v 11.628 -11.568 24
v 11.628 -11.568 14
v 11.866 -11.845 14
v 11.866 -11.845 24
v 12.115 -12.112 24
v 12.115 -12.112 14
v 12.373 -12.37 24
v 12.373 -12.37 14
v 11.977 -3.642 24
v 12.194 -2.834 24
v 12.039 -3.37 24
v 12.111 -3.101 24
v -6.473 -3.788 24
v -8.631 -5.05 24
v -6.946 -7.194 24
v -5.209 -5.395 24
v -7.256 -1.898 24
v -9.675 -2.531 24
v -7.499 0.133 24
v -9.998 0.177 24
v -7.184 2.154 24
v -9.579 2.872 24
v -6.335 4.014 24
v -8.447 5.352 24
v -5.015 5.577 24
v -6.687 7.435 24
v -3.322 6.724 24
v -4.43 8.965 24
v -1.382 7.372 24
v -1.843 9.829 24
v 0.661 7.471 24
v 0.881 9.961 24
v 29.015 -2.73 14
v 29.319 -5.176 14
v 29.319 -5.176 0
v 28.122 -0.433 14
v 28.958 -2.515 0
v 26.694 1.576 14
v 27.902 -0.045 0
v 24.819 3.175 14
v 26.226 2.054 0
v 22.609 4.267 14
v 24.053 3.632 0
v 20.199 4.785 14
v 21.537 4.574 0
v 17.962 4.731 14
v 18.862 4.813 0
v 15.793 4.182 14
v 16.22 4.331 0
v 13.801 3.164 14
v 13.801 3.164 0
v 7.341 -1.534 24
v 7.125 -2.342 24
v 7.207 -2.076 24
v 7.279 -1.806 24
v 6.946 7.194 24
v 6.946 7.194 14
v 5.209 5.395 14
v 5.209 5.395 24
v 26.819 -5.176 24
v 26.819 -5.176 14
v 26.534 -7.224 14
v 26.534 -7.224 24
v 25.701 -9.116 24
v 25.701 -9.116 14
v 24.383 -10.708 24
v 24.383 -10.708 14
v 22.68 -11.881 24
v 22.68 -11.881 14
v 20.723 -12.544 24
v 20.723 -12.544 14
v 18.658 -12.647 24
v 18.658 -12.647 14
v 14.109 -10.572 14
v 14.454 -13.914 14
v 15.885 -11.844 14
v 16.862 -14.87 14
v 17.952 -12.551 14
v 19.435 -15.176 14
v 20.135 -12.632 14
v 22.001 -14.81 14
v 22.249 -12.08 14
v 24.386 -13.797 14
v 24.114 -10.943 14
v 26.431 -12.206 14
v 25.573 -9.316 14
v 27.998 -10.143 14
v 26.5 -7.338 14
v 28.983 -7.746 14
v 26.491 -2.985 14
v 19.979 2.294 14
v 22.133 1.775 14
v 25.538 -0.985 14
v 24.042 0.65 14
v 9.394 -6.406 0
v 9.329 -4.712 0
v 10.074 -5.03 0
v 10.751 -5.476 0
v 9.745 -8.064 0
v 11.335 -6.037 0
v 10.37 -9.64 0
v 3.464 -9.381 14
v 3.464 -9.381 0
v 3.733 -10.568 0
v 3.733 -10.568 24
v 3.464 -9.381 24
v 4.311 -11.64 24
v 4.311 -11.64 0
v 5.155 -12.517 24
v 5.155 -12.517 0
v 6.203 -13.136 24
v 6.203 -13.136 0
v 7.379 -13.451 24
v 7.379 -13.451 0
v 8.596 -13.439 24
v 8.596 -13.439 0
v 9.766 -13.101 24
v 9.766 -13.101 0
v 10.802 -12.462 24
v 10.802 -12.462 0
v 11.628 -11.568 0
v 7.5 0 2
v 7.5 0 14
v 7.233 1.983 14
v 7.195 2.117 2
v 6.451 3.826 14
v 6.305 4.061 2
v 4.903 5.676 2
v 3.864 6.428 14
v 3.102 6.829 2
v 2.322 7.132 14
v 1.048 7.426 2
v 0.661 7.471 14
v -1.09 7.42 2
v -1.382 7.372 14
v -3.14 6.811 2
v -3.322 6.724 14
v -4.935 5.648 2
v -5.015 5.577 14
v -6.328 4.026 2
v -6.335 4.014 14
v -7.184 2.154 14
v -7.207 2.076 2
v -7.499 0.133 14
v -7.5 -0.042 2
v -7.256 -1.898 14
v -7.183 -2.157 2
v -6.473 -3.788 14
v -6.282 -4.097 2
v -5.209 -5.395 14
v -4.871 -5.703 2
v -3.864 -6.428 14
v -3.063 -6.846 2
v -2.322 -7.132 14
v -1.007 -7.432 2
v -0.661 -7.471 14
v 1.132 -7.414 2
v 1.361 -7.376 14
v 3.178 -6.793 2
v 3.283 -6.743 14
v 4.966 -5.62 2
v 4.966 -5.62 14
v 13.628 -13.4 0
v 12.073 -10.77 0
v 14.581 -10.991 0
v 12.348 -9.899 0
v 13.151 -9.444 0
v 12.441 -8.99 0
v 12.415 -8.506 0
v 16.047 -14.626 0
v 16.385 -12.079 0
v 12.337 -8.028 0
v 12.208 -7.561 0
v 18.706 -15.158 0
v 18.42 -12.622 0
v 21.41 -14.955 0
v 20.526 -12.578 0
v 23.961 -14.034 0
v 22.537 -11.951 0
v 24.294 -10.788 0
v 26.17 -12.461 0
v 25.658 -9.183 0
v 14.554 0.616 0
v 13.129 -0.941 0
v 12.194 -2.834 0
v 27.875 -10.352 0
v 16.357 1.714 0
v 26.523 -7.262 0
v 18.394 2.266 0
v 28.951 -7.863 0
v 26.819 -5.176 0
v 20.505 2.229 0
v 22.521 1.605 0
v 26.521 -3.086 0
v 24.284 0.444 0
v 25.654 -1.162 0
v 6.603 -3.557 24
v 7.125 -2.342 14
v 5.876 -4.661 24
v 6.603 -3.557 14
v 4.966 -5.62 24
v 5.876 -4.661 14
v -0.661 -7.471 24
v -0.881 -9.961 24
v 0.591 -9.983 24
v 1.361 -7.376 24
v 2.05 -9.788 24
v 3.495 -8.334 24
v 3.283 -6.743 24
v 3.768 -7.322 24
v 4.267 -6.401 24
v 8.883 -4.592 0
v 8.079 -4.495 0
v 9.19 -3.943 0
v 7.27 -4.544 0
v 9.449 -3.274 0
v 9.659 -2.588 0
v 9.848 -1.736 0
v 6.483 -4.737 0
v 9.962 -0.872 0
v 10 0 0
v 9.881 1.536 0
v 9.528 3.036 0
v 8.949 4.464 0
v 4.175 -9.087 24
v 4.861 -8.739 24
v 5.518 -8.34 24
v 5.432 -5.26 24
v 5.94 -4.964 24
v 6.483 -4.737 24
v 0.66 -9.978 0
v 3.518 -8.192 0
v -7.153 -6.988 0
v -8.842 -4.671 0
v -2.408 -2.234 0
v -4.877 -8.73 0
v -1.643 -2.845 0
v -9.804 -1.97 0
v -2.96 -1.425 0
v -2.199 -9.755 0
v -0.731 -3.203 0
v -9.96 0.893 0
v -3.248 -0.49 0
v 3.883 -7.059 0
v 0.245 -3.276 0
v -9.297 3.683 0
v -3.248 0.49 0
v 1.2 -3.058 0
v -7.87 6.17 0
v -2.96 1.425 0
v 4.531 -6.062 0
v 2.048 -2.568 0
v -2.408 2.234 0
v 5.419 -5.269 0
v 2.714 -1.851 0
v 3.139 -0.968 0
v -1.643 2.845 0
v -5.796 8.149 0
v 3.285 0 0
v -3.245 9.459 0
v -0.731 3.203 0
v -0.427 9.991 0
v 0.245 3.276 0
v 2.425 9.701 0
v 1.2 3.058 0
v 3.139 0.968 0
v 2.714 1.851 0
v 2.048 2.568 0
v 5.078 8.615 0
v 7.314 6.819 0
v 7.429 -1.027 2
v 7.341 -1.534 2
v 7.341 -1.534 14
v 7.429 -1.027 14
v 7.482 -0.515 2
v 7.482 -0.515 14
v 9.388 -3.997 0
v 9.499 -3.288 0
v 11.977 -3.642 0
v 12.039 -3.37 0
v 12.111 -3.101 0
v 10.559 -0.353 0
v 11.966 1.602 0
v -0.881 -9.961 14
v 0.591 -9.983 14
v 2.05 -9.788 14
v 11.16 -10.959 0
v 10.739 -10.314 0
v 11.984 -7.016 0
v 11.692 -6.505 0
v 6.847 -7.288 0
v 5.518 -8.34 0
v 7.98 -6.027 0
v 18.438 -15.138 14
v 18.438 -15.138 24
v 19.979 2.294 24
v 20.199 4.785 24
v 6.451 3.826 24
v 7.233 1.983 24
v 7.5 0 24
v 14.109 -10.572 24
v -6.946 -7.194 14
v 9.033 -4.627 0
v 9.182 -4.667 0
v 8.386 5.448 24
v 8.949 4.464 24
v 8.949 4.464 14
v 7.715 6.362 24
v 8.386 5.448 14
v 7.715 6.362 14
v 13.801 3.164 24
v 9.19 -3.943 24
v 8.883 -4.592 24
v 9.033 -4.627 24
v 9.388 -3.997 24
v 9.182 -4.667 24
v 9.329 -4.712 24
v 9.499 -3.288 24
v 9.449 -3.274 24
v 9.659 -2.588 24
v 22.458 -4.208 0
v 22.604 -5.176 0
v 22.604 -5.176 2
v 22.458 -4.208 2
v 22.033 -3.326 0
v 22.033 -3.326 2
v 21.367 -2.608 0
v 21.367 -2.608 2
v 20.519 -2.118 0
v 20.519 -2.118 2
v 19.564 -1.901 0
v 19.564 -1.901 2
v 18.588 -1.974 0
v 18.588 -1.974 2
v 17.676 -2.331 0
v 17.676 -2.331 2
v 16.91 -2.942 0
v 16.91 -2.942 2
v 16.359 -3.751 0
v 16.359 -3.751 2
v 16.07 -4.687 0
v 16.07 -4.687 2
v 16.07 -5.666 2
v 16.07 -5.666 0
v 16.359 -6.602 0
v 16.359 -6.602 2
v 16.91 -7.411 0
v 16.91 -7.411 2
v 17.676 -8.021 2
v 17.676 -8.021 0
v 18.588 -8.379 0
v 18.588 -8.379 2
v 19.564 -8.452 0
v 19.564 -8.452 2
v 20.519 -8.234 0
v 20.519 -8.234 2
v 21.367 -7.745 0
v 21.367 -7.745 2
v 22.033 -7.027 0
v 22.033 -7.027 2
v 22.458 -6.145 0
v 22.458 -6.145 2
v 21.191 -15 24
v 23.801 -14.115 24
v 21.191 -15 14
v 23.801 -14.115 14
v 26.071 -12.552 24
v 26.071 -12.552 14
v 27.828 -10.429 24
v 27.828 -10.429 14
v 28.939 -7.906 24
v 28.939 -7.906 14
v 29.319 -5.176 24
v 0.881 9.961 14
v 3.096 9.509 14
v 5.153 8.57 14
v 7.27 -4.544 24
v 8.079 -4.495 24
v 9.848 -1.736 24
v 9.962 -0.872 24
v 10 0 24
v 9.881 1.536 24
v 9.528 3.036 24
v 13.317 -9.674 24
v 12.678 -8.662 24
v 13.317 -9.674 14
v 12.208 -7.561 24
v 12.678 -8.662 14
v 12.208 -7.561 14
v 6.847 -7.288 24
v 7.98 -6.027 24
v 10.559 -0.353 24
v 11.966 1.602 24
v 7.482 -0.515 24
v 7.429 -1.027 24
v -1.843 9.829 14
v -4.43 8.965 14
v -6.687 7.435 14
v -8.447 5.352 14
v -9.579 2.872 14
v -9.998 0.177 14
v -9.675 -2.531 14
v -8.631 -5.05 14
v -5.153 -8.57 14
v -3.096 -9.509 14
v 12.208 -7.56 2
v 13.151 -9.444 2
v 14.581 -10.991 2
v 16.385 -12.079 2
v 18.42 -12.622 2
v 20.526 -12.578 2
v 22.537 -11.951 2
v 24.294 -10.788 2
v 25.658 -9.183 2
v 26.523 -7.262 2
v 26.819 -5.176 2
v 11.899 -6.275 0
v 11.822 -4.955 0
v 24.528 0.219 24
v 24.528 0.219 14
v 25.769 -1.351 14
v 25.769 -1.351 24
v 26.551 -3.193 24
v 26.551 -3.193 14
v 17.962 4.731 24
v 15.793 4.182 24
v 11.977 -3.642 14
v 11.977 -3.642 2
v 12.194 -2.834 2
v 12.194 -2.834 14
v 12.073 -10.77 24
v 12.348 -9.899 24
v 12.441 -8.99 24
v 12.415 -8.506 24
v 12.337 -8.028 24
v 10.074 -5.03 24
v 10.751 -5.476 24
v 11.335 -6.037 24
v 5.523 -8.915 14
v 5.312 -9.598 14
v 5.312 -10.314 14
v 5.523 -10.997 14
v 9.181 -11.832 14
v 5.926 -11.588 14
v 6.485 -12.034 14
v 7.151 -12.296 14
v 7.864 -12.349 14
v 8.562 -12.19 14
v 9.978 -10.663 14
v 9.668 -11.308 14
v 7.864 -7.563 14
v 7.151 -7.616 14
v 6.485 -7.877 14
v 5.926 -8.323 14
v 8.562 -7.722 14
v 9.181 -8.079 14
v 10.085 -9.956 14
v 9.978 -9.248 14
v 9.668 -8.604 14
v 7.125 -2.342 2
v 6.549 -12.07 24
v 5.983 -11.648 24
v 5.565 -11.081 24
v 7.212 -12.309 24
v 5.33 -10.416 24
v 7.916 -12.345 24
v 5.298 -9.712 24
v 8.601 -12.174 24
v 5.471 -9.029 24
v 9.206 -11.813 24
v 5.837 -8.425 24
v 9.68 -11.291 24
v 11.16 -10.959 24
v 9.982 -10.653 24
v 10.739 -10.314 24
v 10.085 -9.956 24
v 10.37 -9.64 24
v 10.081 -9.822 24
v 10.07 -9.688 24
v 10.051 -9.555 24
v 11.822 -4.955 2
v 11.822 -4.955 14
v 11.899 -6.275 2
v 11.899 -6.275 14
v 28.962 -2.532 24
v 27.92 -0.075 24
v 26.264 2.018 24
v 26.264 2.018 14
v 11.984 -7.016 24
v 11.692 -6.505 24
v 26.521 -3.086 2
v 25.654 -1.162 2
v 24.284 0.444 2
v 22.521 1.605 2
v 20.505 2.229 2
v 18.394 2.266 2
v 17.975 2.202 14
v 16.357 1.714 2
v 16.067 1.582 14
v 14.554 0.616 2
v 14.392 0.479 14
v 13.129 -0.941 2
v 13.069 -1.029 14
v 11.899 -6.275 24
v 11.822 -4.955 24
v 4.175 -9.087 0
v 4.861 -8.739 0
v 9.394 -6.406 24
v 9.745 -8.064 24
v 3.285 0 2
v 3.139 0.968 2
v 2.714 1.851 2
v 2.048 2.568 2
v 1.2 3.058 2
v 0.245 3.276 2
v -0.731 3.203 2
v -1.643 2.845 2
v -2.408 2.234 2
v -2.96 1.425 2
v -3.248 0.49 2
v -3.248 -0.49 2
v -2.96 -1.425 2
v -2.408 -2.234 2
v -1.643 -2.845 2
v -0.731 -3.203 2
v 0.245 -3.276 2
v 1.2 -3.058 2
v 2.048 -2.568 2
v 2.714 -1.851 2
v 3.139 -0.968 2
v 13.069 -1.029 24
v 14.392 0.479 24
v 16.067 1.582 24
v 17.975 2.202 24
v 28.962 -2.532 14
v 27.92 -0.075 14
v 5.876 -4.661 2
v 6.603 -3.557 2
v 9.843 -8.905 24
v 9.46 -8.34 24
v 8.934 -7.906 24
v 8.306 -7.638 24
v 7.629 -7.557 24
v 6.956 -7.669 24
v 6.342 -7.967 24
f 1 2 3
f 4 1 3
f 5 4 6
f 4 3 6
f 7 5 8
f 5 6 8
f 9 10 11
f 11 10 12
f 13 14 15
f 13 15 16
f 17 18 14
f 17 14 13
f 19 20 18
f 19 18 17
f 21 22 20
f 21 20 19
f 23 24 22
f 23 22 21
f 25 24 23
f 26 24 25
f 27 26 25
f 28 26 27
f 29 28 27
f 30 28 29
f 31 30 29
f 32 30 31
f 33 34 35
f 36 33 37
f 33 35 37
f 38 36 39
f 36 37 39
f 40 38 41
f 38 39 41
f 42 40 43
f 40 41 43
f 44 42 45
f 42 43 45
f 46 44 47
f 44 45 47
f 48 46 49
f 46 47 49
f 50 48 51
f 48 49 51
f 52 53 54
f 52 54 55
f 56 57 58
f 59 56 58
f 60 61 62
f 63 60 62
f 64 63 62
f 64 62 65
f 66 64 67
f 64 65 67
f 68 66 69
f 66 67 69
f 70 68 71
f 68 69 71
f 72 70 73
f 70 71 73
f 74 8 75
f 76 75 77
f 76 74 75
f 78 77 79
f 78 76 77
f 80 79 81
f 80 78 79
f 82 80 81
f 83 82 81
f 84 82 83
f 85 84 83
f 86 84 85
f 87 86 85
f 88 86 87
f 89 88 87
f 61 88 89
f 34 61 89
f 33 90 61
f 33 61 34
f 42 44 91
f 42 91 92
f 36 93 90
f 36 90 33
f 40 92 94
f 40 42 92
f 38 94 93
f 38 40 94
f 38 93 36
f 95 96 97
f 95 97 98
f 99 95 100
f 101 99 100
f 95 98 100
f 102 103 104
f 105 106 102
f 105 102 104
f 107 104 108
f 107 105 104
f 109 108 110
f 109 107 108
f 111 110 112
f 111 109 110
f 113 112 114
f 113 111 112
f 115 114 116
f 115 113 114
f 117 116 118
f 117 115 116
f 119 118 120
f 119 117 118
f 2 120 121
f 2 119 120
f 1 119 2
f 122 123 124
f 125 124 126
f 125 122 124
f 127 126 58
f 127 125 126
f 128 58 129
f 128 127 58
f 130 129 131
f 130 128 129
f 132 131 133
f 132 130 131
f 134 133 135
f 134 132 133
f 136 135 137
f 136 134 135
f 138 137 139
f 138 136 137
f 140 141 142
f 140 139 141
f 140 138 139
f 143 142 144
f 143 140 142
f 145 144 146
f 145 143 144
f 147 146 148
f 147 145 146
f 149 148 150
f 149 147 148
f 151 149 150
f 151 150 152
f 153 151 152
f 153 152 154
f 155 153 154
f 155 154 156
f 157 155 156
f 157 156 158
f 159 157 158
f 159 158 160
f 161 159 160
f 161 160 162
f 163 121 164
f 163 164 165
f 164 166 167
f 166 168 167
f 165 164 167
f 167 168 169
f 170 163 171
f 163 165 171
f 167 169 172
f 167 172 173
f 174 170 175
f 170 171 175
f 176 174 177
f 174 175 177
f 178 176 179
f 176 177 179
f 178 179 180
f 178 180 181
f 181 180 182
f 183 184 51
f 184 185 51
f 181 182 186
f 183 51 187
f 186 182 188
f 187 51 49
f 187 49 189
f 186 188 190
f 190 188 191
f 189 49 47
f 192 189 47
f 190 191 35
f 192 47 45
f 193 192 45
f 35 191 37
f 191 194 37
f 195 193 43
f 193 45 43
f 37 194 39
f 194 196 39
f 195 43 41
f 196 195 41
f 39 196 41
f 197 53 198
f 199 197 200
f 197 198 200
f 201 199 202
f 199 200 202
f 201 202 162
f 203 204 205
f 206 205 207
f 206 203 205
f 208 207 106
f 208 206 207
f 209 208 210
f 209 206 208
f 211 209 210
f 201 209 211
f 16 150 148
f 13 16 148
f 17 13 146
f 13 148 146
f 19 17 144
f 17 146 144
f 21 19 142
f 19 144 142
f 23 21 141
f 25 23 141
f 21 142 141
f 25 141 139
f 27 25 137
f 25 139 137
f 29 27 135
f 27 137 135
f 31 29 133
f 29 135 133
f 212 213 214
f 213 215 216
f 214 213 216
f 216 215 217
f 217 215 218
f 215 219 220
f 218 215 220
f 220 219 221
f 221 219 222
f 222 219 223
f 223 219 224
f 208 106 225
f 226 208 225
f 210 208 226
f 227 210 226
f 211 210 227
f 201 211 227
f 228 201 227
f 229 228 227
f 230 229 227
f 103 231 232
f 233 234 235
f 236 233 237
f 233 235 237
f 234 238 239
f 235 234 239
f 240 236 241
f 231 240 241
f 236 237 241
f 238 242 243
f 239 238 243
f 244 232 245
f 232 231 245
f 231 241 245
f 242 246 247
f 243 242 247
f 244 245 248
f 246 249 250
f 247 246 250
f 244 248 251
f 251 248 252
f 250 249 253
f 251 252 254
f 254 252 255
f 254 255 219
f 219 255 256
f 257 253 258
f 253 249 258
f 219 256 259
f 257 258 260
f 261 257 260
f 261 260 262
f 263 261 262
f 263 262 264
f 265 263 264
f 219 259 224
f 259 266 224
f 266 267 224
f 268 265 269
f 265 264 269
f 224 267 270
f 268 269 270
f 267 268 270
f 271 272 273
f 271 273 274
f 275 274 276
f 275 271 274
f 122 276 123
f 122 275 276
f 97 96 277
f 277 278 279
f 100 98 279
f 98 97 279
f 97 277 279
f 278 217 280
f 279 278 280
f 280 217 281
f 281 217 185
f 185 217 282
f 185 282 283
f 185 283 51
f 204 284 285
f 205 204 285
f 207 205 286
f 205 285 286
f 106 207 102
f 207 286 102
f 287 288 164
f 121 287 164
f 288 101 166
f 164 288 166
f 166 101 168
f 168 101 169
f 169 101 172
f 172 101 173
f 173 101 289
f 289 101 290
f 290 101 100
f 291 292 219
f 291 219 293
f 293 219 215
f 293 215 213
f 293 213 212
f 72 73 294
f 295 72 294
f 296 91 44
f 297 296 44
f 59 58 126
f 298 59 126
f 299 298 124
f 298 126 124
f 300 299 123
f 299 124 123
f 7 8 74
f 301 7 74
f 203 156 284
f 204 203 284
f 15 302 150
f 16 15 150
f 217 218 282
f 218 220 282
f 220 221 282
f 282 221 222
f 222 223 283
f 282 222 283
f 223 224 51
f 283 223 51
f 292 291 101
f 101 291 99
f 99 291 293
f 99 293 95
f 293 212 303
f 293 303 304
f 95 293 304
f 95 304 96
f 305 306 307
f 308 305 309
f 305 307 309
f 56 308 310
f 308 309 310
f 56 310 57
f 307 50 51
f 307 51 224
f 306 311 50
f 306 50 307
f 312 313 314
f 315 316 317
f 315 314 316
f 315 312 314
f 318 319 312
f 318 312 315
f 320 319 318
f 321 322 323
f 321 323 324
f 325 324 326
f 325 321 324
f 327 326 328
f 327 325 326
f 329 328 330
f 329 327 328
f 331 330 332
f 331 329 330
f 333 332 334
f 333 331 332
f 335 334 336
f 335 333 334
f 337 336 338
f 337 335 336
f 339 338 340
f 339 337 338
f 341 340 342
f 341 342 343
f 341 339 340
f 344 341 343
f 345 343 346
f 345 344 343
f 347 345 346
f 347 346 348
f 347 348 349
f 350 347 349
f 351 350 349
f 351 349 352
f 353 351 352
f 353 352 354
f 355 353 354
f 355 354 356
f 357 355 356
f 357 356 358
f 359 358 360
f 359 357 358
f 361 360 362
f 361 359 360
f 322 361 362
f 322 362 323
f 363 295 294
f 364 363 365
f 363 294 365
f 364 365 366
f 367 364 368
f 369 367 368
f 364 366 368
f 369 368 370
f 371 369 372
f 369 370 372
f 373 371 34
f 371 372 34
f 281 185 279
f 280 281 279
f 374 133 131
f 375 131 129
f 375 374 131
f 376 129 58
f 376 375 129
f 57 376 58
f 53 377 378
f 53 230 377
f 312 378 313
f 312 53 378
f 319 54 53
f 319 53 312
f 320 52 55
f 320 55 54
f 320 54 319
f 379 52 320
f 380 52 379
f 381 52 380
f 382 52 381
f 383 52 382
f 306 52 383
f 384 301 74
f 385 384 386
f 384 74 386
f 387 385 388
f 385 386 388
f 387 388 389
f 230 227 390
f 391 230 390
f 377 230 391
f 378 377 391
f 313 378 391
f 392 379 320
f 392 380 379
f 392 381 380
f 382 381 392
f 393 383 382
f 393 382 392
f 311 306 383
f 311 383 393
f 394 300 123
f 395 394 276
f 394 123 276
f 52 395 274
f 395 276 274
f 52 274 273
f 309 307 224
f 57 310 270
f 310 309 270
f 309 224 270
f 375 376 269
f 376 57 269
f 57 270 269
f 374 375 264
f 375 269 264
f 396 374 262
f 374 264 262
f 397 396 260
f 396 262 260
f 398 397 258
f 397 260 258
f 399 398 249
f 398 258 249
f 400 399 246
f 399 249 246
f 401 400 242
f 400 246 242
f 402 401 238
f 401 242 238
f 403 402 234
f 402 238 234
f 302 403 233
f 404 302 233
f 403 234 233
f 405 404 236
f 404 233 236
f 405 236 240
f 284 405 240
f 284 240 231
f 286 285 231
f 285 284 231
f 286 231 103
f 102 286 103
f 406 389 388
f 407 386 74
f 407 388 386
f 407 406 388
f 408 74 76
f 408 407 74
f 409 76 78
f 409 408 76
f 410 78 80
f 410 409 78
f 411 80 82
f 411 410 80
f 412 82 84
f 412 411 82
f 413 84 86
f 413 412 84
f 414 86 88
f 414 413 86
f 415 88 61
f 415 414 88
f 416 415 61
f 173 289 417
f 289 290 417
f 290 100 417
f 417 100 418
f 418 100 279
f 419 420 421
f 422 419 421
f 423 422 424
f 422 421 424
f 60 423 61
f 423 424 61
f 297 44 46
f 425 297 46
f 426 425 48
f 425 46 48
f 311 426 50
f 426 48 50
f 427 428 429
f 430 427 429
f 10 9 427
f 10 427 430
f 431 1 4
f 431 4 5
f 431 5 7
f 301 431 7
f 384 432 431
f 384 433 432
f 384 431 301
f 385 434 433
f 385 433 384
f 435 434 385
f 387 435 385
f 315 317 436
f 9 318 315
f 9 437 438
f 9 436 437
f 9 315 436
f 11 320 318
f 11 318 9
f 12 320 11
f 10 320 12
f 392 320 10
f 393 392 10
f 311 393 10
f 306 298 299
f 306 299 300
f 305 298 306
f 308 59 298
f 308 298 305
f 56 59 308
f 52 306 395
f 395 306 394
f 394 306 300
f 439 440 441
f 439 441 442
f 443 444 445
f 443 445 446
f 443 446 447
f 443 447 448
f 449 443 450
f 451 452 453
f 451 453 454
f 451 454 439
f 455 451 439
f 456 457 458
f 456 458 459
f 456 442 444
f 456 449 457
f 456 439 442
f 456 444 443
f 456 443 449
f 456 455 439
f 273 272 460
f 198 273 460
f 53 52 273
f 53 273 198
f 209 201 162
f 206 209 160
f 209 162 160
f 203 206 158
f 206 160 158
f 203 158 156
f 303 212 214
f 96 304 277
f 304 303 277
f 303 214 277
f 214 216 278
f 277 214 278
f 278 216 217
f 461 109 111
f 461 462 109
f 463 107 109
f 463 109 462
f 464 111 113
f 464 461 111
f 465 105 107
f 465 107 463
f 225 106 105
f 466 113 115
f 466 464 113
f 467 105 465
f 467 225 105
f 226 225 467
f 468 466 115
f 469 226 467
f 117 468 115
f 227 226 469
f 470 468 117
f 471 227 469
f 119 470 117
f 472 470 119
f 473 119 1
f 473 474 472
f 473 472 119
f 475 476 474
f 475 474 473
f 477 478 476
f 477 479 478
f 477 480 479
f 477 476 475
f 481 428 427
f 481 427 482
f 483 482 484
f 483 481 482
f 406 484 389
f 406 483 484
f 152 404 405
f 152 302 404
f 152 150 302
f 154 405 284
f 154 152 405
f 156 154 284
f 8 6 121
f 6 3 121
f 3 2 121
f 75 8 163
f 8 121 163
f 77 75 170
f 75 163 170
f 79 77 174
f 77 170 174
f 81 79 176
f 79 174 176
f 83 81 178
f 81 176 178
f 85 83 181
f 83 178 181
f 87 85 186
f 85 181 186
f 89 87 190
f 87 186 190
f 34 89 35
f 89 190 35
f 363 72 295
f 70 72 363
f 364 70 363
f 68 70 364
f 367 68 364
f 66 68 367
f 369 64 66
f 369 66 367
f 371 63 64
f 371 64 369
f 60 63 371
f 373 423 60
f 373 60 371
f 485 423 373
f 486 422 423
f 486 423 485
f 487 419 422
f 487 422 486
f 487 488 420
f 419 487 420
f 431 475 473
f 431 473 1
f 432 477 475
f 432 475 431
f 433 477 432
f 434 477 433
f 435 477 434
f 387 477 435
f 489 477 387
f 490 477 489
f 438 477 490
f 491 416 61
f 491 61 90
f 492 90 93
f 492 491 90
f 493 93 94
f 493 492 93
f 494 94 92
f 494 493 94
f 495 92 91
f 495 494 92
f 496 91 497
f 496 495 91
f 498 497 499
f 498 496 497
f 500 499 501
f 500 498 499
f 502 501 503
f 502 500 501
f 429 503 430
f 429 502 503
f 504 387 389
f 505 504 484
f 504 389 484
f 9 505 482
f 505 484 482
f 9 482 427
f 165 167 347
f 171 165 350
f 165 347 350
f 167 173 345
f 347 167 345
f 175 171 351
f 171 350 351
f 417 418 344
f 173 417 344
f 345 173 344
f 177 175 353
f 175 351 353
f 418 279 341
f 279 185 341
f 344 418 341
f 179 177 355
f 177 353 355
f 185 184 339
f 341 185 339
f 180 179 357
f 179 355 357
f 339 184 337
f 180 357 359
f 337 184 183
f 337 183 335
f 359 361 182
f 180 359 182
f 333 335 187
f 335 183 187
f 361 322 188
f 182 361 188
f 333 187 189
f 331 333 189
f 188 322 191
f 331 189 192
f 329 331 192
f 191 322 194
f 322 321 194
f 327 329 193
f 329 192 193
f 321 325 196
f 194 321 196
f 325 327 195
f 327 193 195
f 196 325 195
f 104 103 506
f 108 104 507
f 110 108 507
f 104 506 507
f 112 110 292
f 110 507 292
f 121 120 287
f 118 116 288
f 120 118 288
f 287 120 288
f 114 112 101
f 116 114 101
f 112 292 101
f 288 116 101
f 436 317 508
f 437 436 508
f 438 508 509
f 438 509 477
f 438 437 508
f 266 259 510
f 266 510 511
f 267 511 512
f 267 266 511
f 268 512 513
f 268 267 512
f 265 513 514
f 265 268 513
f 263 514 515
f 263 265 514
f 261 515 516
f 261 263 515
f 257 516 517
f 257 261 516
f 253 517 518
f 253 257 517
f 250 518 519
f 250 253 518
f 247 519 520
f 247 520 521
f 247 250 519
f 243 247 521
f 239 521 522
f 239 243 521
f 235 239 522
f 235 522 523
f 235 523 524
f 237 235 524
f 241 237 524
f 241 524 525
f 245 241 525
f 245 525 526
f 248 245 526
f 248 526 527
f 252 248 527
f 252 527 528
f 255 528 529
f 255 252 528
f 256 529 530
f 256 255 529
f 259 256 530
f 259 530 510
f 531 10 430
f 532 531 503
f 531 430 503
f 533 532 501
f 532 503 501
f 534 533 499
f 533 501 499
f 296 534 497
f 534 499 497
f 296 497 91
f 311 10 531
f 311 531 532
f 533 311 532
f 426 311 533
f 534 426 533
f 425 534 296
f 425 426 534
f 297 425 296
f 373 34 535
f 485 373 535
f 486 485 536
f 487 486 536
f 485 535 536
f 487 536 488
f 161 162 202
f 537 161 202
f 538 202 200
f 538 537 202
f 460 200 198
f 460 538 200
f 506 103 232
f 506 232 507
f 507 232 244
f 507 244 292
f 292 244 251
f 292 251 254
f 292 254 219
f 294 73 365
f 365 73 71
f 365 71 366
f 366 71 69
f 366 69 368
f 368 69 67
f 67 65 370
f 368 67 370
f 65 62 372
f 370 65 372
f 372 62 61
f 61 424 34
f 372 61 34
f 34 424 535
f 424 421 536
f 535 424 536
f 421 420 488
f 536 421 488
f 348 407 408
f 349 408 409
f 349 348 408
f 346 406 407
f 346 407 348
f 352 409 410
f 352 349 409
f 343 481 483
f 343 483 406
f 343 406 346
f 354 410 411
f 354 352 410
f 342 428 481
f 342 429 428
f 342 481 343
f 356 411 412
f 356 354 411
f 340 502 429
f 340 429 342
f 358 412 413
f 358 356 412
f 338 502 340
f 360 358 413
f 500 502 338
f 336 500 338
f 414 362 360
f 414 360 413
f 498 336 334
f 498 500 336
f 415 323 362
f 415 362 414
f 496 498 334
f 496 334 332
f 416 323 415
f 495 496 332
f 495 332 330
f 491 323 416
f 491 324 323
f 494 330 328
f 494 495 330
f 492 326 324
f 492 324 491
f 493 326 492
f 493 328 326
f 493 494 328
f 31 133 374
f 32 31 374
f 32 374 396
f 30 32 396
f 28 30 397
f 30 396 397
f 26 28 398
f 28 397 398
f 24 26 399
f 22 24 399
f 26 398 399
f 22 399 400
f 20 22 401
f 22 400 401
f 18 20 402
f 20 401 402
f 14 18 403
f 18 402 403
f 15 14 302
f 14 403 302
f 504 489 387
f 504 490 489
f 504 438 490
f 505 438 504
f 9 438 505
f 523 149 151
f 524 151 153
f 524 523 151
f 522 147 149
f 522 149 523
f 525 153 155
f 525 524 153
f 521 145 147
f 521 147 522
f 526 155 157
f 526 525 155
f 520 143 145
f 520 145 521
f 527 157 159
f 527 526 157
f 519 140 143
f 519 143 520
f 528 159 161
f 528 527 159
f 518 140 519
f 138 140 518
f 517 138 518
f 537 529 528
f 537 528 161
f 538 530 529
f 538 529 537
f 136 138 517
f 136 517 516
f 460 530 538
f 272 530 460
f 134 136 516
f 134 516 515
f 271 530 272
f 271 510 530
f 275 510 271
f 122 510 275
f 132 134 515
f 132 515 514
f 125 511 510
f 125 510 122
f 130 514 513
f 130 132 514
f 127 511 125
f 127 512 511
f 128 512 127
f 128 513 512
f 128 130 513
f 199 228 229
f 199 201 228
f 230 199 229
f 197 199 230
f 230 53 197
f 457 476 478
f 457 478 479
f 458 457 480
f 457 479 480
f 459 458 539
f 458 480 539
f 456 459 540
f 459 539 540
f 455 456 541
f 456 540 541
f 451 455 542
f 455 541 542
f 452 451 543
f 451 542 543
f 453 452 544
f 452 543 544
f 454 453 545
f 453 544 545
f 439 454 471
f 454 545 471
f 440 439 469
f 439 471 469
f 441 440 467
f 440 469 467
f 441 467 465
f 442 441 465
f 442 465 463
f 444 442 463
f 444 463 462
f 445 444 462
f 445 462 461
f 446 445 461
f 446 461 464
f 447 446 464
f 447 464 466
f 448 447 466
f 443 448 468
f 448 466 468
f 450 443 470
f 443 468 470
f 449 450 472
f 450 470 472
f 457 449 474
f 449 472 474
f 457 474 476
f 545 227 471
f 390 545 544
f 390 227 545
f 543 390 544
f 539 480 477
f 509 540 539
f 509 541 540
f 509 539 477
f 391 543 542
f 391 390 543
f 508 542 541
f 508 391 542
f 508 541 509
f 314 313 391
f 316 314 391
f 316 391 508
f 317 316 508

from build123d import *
from build123d.topology import SkipClean

# Parameters (mm, degrees)
SKETCH1_R             = 7.5
SKETCH1_R_2           = 3.285
BOSS_EXTRUDE1_DEPTH   = 2
BOSS_EXTRUDE1_2_DEPTH = 2
SKETCH1_3_R           = 10
SKETCH1_3_R_2         = 7.5
BOSS_EXTRUDE2_DEPTH   = 14
BOSS_EXTRUDE3_DEPTH   = 10
BOSS_EXTRUDE4_DEPTH   = 24
SKETCH5_R             = 4.496880173
BOSS_EXTRUDE5_DEPTH   = 24
SKETCH6_R             = 2.4
CUT_EXTRUDE1_DEPTH    = 10


with BuildPart() as part:
    # Sketch1 → Boss-Extrude1 (new body)
    with BuildSketch(Plane.XY):
        Circle(SKETCH1_R)
        Circle(SKETCH1_R_2, mode=Mode.SUBTRACT)
    extrude(amount=BOSS_EXTRUDE1_DEPTH)

    # Sketch1<3> → Boss-Extrude2 (add)
    # profile 1 of 2: a face of its own
    with BuildSketch(Plane.XY):
        Circle(SKETCH1_3_R)
        Circle(SKETCH1_3_R_2, mode=Mode.SUBTRACT)
    # profile 2 of 2: a face of its own
    with BuildSketch(Plane.XY):
        with Locations((19.318516526, -5.176380902)):
            Circle(SKETCH1_3_R)
        with Locations((19.318516526, -5.176380902)):
            Circle(SKETCH1_3_R_2, mode=Mode.SUBTRACT)
    extrude(amount=BOSS_EXTRUDE2_DEPTH)


with BuildPart() as body_2:
    # Sketch1 → Boss-Extrude1 2 (new body)
    with BuildSketch(Plane.XY):
        with Locations((19.318516526, -5.176380902)):
            Circle(SKETCH1_R)
        with Locations((19.318516526, -5.176380902)):
            Circle(SKETCH1_R_2, mode=Mode.SUBTRACT)
    extrude(amount=BOSS_EXTRUDE1_2_DEPTH)



with BuildPart() as boss_extrude2_piece_1:
    # of the separate pieces the step leaves, piece 1, a body of its own (boss_extrude2_pieces)
    add(part.part.solids().sort_by_distance((3.285, 0, 0))[0])

    # Sketch2 → Boss-Extrude3 (add)
    with SkipClean():  # the faces are left unmerged after this step: merging them gives an invalid solid
        with BuildSketch(Plane.XY.offset(14)):
            with BuildLine():
                ThreePointArc((0.880723614, 9.961140794), (-9.097879067, 4.150734451), (-6.945976325, -7.193984493))
                Line((-6.945976325, -7.193984493), (-5.209482244, -5.39548837))
                ThreePointArc((-5.209482244, -5.39548837), (-6.8234093, 3.113050838), (0.66054271, 7.470855595))
                Line((0.66054271, 7.470855595), (0.880723614, 9.961140794))
            make_face()
            with BuildLine():
                Line((-0.66054271, -7.470855595), (-0.880723614, -9.961140794))
                ThreePointArc((-0.880723614, -9.961140794), (5.731995045, -8.194158456), (9.659258283, -2.588190376))
                ThreePointArc((9.659258283, -2.588190376), (9.914448619, -1.305261884), (10, 0))
                ThreePointArc((10, 0), (9.204883575, 3.907699883), (6.945976325, 7.193984493))
                Line((6.945976325, 7.193984493), (5.209482244, 5.39548837))
                ThreePointArc((5.209482244, 5.39548837), (6.903662681, 2.930774912), (7.5, 0))
                ThreePointArc((7.5, 0), (5.06438198, -5.531910625), (-0.66054271, -7.470855595))
            make_face()
            with BuildLine():
                ThreePointArc((20.199240139, 4.784759892), (13.586521544, 3.017777598), (9.659258283, -2.588190376))
                ThreePointArc((9.659258283, -2.588190376), (9.68232481, -7.849171431), (12.372540201, -12.370365396))
                Line((12.372540201, -12.370365396), (14.109034282, -10.571869272))
                ThreePointArc((14.109034282, -10.571869272), (12.495107225, -2.063330064), (19.979059236, 2.294474693))
                Line((19.979059236, 2.294474693), (20.199240139, 4.784759892))
            make_face()
            with BuildLine():
                ThreePointArc((29.318516526, -5.176380902), (28.523400101, -1.268681019), (26.264492851, 2.017603591))
                Line((26.264492851, 2.017603591), (24.52799877, 0.219107468))
                ThreePointArc((24.52799877, 0.219107468), (26.222179207, -2.24560599), (26.818516526, -5.176380902))
                ThreePointArc((26.818516526, -5.176380902), (24.382898506, -10.708291527), (18.657973816, -12.647236497))
                Line((18.657973816, -12.647236497), (18.437792912, -15.137521696))
                ThreePointArc((18.437792912, -15.137521696), (26.071025832, -12.552261735), (29.318516526, -5.176380902))
            make_face()
        extrude(amount=BOSS_EXTRUDE3_DEPTH)


with BuildPart() as boss_extrude2_piece_2:
    # of the separate pieces the step leaves, piece 2, a body of its own (boss_extrude2_pieces)
    add(part.part.solids().sort_by_distance((29.318516526, -5.176380902, 0))[0])


with BuildPart() as boss_extrude3_piece_1:
    # of the separate pieces the step leaves, piece 1, a body of its own (boss_extrude3_pieces)
    add(boss_extrude2_piece_1.part.solids().sort_by_distance((3.285, 0, 0))[0])


with BuildPart() as boss_extrude3_piece_2:
    # of the separate pieces the step leaves, piece 2, a body of its own (boss_extrude3_pieces)
    add(boss_extrude2_piece_1.part.solids().sort_by_distance((18.437792912, -15.137521696, 14))[0])


with BuildPart() as boss_extrude3_piece_3:
    # of the separate pieces the step leaves, piece 3, a body of its own (boss_extrude3_pieces)
    add(boss_extrude2_piece_1.part.solids().sort_by_distance((20.199240139, 4.784759892, 14))[0])


with BuildPart() as body_2_1:
    with SkipClean():  # the faces are left unmerged after this step: merging them gives an invalid solid
        add(body_2.part)

        add(boss_extrude2_piece_2.part)  # Boss-Extrude4 merges Boss-Extrude2 piece 2

        add(boss_extrude3_piece_1.part)  # Boss-Extrude4 merges Boss-Extrude3 piece 1

        add(boss_extrude3_piece_3.part)  # Boss-Extrude4 merges Boss-Extrude3 piece 3
        # Sketch4 → Boss-Extrude4 (add)
        with BuildSketch(Plane.XY.offset(24)):
            Polygon((13.800709497, 3.163511519), (8.948507271, 4.463655187), (5.517807029, -8.339892421), (10.370009255, -9.640036089), align=None)
        extrude(amount=-BOSS_EXTRUDE4_DEPTH)

    # Sketch5 → Boss-Extrude5 (add)
    with SkipClean():  # the faces are left unmerged after this step: merging them gives an invalid solid
        with BuildSketch(Plane.XY.offset(24)):
            with Locations((7.943908142, -8.989964255)):
                Circle(SKETCH5_R)
        extrude(amount=-BOSS_EXTRUDE5_DEPTH)

    # Sketch6 → Cut-Extrude1 (cut)
    with SkipClean():  # the faces are left unmerged after this step: merging them gives an invalid solid
        with BuildSketch(Plane.XY.offset(24)):
            with Locations((7.685089097, -9.955890081)):
                Circle(SKETCH6_R)
        extrude(amount=-CUT_EXTRUDE1_DEPTH, mode=Mode.SUBTRACT)


solid = Compound([boss_extrude3_piece_2.part, body_2_1.part])
